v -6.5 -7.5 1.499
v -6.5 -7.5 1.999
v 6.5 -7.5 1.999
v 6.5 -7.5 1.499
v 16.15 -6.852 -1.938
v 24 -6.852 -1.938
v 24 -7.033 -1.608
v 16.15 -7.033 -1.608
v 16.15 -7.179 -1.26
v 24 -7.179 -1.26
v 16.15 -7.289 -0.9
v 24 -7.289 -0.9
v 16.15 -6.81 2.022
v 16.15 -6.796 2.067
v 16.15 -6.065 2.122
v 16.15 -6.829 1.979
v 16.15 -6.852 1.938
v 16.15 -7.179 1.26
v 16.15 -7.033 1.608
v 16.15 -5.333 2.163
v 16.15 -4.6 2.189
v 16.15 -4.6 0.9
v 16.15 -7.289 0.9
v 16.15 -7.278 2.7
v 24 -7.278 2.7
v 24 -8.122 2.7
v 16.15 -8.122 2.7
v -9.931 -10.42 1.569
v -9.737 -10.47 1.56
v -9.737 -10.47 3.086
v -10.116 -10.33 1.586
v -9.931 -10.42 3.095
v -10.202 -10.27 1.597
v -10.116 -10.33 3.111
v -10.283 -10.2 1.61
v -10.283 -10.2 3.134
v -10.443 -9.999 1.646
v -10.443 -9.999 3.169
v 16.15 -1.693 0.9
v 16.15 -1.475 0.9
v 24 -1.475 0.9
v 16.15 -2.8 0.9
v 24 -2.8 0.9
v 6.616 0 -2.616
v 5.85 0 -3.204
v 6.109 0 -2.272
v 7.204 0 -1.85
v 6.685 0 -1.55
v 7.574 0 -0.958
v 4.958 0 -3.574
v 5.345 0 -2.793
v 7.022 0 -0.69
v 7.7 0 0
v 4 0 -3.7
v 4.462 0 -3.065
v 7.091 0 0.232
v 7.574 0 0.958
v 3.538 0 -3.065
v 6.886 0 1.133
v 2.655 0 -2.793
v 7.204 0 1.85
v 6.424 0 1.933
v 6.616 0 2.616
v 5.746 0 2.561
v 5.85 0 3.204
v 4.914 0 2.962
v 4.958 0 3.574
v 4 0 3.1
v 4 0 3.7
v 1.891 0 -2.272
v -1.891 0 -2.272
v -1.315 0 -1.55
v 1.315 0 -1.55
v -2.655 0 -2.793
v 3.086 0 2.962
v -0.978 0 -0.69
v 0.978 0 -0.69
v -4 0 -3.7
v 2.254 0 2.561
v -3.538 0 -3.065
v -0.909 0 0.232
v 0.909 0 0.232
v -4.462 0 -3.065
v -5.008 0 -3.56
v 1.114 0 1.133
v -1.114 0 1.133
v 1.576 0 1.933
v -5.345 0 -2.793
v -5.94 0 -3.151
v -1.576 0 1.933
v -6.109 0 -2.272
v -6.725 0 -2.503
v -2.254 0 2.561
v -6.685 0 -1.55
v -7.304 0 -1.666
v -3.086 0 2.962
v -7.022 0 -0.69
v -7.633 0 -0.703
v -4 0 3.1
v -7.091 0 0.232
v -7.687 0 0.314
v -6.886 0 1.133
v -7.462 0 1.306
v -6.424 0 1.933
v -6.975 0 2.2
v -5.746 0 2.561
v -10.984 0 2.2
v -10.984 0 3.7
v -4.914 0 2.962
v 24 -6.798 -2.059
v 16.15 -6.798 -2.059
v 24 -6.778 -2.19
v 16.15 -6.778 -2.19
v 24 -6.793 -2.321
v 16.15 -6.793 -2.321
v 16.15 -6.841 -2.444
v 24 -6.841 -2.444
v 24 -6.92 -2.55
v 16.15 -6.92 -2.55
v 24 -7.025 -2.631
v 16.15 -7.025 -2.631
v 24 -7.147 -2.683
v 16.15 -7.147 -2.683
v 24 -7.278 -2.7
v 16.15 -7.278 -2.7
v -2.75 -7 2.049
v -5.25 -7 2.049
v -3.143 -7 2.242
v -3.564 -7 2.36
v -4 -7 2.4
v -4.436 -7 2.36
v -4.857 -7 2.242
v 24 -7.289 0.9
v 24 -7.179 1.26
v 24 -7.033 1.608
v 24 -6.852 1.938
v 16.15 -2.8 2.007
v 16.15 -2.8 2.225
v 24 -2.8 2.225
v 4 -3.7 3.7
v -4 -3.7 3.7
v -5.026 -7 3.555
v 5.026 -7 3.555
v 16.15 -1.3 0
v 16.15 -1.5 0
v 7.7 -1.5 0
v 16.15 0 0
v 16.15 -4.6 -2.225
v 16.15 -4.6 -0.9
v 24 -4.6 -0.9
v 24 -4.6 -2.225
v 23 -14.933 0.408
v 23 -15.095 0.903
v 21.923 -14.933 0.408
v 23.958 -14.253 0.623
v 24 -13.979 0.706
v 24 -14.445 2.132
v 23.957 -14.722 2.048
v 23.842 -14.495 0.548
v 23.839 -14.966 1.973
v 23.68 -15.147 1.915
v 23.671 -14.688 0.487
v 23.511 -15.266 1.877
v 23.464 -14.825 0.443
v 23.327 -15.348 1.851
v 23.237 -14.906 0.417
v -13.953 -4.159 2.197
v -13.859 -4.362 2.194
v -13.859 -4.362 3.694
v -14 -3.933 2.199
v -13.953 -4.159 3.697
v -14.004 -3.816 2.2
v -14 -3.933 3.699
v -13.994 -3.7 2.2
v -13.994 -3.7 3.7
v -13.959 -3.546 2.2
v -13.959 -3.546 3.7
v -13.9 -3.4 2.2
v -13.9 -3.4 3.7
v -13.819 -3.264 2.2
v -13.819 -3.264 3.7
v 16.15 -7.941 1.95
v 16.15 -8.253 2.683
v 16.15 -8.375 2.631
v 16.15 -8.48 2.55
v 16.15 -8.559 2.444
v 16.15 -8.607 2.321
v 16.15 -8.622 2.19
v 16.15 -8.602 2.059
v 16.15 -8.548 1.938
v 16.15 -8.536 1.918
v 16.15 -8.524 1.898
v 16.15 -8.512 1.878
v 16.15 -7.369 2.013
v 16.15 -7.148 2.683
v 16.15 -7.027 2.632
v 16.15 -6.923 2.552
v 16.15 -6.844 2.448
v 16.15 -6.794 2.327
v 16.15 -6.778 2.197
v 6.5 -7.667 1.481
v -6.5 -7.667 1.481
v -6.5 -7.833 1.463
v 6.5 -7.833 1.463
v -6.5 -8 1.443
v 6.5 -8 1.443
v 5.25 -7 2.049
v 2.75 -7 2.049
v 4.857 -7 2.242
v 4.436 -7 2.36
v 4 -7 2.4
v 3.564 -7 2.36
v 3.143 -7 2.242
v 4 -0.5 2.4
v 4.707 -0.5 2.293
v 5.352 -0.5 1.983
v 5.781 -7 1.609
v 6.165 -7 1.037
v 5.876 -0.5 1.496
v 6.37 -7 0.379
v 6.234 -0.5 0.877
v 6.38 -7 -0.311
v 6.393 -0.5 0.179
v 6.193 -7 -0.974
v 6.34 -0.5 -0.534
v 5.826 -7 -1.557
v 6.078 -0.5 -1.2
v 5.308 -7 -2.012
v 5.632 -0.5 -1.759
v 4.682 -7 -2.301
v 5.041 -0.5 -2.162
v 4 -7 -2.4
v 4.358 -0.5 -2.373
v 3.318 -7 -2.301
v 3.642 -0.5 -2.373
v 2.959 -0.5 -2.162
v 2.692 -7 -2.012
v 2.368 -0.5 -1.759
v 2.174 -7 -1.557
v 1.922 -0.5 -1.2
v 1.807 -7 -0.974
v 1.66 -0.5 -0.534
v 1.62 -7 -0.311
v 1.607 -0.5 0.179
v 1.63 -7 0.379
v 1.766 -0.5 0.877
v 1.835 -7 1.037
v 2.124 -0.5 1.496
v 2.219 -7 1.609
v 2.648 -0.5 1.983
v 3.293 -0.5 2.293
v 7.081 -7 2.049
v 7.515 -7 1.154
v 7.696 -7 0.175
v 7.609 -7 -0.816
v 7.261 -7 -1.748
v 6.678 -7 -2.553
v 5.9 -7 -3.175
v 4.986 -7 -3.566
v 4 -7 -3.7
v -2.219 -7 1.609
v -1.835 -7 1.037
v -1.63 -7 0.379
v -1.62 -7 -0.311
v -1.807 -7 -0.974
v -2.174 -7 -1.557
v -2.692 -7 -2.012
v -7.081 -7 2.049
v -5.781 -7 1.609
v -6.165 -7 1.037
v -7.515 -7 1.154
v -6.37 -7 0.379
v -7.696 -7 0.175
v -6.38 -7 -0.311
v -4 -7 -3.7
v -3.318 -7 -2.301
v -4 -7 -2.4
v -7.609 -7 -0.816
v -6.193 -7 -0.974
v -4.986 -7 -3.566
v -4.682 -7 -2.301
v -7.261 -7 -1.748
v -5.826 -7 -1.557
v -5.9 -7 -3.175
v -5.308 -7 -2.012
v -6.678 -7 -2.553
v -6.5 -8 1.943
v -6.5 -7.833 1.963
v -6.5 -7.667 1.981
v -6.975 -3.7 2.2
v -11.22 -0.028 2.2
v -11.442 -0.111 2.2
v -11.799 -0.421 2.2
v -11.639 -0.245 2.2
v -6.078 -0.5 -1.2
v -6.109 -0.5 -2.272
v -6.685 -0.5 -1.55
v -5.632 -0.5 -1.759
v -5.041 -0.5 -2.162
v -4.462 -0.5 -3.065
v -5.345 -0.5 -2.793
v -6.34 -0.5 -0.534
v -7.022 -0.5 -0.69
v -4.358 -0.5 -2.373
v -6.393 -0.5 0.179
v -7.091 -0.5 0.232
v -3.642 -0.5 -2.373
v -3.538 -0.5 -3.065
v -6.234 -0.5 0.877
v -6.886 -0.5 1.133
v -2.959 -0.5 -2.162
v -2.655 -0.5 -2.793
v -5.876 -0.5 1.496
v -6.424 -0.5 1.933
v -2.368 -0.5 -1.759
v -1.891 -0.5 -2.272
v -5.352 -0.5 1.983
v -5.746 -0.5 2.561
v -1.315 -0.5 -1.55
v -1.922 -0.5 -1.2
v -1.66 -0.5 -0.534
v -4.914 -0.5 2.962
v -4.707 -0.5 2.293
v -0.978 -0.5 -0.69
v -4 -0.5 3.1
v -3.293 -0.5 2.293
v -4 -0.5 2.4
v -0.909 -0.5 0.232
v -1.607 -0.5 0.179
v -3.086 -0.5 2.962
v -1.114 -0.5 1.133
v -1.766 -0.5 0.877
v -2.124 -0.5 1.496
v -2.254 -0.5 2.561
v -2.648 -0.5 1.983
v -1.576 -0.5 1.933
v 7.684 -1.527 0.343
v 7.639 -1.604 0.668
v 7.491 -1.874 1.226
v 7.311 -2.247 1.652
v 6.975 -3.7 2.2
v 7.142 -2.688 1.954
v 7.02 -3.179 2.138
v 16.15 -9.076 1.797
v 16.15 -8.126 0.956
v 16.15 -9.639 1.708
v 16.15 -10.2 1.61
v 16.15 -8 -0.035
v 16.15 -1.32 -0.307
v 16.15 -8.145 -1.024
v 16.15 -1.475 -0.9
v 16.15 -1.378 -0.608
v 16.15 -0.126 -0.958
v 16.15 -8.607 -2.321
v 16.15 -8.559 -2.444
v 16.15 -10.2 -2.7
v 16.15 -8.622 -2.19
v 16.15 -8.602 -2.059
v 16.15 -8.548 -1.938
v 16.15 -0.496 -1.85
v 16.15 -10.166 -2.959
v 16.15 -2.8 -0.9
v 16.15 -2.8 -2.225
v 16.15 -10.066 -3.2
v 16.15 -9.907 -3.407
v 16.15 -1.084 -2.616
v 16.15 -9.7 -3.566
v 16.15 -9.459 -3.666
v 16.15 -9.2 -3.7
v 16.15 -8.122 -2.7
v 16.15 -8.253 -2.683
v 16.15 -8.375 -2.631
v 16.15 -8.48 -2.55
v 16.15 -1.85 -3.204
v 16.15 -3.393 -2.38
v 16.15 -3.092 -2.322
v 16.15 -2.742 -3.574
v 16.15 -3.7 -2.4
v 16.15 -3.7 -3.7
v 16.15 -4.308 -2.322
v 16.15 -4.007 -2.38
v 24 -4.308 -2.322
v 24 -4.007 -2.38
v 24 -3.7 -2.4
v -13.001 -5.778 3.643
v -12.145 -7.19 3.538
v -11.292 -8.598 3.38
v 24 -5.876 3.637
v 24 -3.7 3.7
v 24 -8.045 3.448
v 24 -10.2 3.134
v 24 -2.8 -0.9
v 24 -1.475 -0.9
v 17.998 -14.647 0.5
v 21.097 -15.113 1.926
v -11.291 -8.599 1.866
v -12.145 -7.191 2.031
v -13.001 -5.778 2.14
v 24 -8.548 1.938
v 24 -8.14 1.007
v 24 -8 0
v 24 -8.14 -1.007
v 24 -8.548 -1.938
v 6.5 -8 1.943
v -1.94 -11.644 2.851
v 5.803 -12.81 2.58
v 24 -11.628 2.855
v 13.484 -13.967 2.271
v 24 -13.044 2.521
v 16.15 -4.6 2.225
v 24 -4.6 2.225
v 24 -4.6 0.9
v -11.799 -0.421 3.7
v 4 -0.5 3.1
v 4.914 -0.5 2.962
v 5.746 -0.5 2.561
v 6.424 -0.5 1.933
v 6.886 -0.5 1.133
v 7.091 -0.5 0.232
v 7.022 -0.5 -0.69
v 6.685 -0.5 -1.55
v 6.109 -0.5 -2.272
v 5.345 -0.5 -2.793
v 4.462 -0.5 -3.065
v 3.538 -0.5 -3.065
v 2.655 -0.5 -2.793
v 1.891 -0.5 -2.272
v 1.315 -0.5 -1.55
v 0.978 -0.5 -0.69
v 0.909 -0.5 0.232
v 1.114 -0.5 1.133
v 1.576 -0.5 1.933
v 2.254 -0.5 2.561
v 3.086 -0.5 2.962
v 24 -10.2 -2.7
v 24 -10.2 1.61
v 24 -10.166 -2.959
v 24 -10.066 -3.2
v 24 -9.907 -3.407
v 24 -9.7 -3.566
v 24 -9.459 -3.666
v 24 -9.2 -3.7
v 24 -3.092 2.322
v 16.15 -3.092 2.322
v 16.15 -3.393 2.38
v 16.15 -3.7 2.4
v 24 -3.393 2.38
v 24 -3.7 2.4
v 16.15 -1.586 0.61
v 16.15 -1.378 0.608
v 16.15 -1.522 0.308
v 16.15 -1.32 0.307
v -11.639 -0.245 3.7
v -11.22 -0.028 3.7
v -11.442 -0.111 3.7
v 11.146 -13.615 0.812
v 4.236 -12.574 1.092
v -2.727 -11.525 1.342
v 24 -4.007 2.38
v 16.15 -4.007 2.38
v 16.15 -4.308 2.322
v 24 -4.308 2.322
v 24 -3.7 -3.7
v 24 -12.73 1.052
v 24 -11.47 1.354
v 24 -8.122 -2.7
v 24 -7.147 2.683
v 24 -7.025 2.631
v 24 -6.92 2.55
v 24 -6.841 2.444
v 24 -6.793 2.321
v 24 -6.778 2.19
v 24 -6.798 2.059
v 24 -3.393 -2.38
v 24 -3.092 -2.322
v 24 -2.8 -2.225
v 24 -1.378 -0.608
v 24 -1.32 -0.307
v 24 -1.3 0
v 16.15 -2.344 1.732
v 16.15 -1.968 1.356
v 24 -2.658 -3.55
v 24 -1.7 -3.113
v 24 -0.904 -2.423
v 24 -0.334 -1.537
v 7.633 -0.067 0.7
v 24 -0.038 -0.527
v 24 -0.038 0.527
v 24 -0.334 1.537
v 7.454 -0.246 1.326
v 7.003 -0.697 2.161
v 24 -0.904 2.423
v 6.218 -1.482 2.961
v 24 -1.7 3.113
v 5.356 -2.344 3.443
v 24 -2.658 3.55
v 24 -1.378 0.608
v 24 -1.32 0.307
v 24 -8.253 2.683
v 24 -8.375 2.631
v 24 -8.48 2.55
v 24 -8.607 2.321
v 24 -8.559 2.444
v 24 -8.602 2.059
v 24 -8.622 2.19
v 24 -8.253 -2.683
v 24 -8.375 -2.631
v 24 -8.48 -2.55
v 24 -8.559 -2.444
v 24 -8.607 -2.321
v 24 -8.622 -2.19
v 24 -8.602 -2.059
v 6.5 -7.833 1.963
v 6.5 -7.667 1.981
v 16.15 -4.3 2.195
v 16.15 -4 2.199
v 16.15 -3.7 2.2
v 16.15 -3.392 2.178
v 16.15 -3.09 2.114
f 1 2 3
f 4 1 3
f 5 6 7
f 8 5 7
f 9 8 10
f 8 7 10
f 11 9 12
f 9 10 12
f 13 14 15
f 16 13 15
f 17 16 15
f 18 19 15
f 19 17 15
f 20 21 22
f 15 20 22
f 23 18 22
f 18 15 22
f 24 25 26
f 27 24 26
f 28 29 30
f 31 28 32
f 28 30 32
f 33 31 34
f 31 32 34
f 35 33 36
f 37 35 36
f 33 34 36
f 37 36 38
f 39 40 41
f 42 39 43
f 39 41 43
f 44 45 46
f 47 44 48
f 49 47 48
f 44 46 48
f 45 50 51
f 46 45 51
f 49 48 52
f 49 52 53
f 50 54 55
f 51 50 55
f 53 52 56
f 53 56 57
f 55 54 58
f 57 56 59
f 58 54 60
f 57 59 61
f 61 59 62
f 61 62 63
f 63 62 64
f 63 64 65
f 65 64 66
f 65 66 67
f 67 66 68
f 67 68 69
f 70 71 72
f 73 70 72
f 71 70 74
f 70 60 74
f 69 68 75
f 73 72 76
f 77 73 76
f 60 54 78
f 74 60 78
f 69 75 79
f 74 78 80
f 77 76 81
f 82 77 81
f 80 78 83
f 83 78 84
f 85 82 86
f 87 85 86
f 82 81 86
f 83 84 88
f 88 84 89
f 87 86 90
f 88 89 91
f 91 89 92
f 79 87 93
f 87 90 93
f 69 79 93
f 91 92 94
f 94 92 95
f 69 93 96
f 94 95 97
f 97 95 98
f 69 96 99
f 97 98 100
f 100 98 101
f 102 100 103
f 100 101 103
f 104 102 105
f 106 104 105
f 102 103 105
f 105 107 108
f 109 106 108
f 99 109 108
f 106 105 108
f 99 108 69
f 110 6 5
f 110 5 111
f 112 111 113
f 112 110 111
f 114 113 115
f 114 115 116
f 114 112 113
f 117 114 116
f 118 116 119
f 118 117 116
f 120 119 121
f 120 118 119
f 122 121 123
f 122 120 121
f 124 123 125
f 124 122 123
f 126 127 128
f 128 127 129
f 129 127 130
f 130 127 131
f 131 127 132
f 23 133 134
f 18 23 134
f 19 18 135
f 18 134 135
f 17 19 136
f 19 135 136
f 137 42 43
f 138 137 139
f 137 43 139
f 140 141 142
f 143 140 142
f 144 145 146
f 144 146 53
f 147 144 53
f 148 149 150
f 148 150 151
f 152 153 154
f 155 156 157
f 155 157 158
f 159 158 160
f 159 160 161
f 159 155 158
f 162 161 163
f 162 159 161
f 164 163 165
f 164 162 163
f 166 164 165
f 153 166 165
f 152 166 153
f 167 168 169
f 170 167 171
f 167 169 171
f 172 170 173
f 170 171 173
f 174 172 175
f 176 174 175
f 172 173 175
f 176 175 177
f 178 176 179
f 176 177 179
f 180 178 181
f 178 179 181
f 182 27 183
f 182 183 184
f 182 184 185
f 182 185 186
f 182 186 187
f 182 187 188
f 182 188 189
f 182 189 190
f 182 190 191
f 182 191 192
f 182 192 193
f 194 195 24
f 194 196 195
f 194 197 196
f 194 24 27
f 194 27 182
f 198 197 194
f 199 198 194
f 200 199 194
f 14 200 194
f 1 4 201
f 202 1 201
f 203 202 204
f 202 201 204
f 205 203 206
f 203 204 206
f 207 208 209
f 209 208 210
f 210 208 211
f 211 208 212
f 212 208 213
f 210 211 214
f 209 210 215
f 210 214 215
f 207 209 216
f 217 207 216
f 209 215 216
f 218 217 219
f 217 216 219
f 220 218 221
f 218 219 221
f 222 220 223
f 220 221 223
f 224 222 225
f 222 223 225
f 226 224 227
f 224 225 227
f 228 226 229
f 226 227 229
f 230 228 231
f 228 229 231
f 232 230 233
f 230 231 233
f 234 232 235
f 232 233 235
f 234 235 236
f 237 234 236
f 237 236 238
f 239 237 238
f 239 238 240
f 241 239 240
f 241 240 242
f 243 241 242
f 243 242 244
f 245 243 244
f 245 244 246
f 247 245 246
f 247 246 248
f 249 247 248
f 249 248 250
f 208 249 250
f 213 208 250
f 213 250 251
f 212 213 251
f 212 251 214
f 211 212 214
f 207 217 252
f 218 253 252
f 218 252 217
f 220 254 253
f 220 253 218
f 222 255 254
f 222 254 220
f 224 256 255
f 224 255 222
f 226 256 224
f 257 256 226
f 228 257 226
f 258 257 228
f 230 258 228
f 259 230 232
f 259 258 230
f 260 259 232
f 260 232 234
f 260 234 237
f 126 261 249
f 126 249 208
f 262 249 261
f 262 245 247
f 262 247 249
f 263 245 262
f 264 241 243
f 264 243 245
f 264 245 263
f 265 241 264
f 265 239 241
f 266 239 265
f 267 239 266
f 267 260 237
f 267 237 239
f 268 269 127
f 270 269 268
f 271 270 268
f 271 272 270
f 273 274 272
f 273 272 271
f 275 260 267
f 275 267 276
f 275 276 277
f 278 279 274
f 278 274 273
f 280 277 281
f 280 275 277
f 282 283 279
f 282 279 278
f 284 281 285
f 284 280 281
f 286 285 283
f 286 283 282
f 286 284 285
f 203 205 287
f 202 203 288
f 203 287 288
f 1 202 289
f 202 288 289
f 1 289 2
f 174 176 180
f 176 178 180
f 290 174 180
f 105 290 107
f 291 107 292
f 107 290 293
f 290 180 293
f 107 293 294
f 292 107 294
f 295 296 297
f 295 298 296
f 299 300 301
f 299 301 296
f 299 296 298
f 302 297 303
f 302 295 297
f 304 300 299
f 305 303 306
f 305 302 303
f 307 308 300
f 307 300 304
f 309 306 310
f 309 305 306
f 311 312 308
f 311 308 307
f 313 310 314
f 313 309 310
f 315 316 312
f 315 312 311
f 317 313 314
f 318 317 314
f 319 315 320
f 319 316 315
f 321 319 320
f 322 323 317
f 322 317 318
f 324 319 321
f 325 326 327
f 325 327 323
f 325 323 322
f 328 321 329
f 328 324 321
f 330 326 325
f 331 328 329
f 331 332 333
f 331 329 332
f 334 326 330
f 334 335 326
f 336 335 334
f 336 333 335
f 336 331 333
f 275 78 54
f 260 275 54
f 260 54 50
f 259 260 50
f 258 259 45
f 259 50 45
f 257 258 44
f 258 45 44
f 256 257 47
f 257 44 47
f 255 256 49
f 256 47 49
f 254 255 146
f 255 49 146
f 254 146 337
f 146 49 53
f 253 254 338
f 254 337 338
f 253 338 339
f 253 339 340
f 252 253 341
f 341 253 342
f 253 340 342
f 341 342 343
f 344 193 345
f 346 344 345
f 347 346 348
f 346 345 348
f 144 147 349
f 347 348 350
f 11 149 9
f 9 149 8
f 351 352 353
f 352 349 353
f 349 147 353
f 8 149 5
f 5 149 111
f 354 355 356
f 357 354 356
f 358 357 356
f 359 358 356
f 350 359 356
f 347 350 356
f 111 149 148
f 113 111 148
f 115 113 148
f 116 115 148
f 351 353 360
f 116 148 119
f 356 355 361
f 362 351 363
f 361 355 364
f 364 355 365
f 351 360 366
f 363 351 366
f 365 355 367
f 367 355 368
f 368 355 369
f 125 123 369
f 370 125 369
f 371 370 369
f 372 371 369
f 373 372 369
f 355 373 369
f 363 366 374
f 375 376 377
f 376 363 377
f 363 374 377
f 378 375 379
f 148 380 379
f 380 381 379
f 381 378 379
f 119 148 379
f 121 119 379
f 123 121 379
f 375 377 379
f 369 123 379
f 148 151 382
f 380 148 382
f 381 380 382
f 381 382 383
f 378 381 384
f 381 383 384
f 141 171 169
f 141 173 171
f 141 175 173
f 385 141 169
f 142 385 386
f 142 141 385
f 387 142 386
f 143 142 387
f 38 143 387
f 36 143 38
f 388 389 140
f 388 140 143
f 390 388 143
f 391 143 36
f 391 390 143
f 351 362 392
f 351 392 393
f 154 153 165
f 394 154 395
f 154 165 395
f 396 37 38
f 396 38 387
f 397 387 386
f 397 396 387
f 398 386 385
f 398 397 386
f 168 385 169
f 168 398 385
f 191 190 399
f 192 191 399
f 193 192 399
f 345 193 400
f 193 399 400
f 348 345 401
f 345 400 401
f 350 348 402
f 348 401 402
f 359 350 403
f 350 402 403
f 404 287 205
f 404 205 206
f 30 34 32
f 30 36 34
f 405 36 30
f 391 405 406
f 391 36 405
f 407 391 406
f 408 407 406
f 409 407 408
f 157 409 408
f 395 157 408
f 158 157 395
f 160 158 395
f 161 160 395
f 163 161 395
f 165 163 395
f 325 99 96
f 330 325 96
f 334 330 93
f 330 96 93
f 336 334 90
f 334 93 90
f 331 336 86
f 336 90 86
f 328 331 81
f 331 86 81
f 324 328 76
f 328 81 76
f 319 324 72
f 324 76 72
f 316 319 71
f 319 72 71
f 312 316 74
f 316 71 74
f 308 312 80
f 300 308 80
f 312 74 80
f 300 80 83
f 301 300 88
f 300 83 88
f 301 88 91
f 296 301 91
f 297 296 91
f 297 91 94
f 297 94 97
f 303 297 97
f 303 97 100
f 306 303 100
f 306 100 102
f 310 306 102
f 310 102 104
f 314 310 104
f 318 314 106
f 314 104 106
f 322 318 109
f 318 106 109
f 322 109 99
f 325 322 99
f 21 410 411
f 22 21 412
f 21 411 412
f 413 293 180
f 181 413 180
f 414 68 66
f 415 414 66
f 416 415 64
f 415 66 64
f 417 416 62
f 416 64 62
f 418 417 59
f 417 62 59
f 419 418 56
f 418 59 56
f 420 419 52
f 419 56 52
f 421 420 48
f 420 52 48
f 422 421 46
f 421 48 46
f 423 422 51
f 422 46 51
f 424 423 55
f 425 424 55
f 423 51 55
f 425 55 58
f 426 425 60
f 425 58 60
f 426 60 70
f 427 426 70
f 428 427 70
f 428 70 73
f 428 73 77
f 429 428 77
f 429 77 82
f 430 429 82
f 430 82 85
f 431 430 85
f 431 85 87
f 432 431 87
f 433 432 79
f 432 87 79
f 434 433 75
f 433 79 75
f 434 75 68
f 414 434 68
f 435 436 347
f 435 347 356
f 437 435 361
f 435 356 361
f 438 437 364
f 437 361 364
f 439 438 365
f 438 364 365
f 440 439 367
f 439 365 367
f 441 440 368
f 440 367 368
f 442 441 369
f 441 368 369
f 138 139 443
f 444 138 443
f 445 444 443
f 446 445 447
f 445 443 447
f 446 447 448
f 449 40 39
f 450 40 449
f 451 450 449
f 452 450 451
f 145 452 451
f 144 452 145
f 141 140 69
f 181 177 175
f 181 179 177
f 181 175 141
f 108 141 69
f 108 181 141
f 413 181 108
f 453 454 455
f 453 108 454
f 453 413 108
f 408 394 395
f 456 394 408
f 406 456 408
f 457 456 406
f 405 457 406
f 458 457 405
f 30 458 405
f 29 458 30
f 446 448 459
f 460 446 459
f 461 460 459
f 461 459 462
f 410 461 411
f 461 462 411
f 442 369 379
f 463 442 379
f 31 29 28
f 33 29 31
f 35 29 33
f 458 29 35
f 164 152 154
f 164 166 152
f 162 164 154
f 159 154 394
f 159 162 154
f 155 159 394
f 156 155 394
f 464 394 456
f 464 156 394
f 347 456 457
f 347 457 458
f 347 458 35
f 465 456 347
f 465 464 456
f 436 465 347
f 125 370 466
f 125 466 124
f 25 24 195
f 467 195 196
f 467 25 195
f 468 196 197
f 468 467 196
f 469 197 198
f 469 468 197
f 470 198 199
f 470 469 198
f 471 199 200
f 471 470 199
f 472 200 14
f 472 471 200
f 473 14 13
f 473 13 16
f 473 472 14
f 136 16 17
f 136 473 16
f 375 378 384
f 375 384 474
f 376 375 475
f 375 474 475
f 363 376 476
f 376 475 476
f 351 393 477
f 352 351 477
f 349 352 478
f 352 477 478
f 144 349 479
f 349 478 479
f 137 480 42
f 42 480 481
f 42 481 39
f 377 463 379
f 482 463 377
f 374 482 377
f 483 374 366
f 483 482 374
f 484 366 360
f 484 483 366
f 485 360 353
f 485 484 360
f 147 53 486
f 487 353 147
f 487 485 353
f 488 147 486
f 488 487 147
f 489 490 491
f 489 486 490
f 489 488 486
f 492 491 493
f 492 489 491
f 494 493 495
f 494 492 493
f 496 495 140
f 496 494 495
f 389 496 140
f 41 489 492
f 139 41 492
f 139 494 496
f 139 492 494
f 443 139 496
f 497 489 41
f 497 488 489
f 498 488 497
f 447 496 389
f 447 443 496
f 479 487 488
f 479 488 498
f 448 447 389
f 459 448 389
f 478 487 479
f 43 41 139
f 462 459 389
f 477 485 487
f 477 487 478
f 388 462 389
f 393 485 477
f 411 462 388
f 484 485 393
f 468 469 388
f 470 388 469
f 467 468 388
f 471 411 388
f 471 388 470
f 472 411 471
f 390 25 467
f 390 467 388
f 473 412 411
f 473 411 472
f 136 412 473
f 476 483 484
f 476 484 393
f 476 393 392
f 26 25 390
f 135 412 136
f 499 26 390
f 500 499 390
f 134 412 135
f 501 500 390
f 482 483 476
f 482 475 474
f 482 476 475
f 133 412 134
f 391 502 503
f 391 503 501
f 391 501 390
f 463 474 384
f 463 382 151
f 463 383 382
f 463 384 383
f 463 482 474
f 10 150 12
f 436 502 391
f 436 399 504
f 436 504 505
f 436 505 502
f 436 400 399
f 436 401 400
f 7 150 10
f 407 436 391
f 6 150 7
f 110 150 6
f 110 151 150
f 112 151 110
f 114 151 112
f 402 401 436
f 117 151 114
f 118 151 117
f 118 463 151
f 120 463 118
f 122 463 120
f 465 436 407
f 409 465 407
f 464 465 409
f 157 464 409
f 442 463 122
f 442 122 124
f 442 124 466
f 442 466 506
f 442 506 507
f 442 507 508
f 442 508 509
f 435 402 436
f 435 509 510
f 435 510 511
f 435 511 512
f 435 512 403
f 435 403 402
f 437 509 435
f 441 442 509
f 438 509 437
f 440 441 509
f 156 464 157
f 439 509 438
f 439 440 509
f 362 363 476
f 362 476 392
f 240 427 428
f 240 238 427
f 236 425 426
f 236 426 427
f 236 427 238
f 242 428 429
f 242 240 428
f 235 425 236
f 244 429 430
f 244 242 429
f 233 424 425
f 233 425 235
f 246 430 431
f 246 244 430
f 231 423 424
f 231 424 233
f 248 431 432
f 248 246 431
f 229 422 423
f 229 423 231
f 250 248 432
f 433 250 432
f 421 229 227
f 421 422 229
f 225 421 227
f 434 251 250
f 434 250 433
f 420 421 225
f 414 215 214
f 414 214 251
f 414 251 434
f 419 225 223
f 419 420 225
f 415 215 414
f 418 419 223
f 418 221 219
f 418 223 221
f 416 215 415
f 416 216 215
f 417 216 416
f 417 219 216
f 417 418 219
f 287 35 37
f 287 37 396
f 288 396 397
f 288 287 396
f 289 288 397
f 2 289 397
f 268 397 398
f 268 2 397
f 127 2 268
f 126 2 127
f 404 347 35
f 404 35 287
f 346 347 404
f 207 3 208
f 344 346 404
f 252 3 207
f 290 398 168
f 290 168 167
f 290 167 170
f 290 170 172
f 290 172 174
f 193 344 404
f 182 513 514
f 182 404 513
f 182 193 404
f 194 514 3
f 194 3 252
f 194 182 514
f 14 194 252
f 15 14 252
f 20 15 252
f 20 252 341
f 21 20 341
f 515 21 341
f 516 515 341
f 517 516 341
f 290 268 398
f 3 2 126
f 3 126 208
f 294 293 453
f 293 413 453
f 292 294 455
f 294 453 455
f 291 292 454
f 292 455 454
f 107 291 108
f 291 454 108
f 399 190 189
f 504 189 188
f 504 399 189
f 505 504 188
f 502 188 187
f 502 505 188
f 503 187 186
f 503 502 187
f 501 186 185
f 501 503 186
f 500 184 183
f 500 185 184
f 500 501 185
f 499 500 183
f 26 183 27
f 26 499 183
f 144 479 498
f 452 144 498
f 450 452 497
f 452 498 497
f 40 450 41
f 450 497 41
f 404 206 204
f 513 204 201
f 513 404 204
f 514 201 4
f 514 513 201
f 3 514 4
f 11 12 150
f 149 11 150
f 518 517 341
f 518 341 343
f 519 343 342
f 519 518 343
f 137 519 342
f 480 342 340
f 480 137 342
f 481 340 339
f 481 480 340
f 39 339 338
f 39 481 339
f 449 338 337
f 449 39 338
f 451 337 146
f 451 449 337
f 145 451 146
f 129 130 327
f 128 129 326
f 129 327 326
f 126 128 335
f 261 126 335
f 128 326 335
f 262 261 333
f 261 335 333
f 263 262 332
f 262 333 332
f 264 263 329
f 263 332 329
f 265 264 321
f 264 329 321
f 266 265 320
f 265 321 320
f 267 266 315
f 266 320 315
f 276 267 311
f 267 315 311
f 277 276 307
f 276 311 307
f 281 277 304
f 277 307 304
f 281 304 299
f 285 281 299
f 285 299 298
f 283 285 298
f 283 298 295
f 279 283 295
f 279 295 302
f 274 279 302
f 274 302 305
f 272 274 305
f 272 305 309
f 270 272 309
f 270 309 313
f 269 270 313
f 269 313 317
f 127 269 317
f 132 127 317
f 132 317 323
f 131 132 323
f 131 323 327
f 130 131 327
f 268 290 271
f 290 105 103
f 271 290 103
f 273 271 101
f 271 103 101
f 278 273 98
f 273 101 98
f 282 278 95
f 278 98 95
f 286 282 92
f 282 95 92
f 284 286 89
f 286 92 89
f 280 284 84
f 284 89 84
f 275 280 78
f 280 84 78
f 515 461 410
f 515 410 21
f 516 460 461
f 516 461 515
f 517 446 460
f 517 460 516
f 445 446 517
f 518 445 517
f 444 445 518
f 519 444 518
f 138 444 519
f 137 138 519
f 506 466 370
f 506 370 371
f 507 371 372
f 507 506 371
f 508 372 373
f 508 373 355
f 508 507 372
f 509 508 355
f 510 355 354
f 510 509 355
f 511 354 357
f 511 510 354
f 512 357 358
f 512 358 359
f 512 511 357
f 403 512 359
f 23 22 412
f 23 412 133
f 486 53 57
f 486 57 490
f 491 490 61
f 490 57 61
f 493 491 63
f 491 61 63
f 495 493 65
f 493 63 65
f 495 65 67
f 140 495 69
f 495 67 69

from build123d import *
from build123d.topology import SkipClean

# Parameters (mm, degrees)
F_2_BLOCK_BODY_DEPTH        = 7
AXLE_START                  = 24
SKETCH2_R                   = 3.7
AXLE_BODY_DEPTH             = 7.85
FAIRING_TOP_REACH           = 35.506
FAIRING_TOP_END_RADIUS      = 3.7
FAIRING_BOTTOM_DEPTH        = 38.2
FAIRING_SIDE_CUT_DEPTH      = 29.754999715
FAIRING_SIDE_CUT_DEPTH_BACK = 29.754999715
FAIRING_CORNER_REACH        = 43.353
FAIRING_CORNER_END_RADIUS   = 3.7
SKETCH6_W                   = 1.5
SKETCH6_H                   = 3.7
SKETCH3_W                   = 1.8
SKETCH3_H                   = 1.8
AXLE_CUT_DEPTH              = 7.85
FILLET1_R                   = 0.5
SKETCH7_R                   = 2.4
BLOCK_HOLES_DEPTH           = 7
SKETCH8_R                   = 3.1
SKETCH8_R_2                 = 2.4
RIM_CUTS_DEPTH              = 0.5
STOPPER_REACH               = 31.255
STOPPER_START_RADIUS        = 36.103557437
STOPPER_END_RADIUS          = 36.103557437
SKETCH9_W                   = 13
SKETCH9_H                   = 0.5
FILLET2_R                   = 1
FAIRING_MAIN_CUT_DEPTH      = 29.754999715
FAIRING_MAIN_CUT_DEPTH_BACK = 29.754999715
FILLET3_R                   = 5
FILLET4_R                   = 1


with BuildPart() as part:
    # Sketch1 → 2 Block Body (new body)
    with BuildSketch(Plane(origin=(0, 0, 0), x_dir=(1, 0, 0), z_dir=(0, 1, 0))):
        with BuildLine():
            Line((4, -3.7), (-4, -3.7))
            ThreePointArc((-4, -3.7), (-7.7, 0), (-4, 3.7))
            Line((-4, 3.7), (4, 3.7))
            ThreePointArc((4, 3.7), (7.7, 0), (4, -3.7))
        make_face()
    extrude(amount=-F_2_BLOCK_BODY_DEPTH)



with BuildPart() as body_2:
    # Sketch2 → Axle Body (new body)
    with BuildSketch(Plane(origin=(0, 0, 0), x_dir=(0, 0, -1), z_dir=(1, 0, 0)).offset(AXLE_START)):
        with BuildLine():
            ThreePointArc((3.7, -3.7), (0, -7.4), (-3.7, -3.7))
            Line((-3.7, -3.7), (-3.7, -10.2))
            Line((-3.7, -10.2), (3.7, -10.2))
            Line((3.7, -10.2), (3.7, -3.7))
        make_face()
        with Locations((0, -3.7)):
            Circle(SKETCH2_R)
    extrude(amount=-AXLE_BODY_DEPTH)


with BuildPart() as part_1:
    add(part.part)

    add(body_2.part)  # Fairing Top merges body 2
    # Fairing Top: up to this cylinder (the profile starts outside it)
    fairing_top_end = Plane(origin=(4, -1.781509, 0), z_dir=(0, 1, 0)) * Cylinder(FAIRING_TOP_END_RADIUS, 79.412, mode=Mode.PRIVATE)
    # Sketch4 → Fairing Top (add, up to the surface)
    with BuildSketch(Plane(origin=(24, 0, 0), x_dir=(0, 0, -1), z_dir=(1, 0, 0)), mode=Mode.PRIVATE) as fairing_top_sk1:
        with BuildLine():
            Line((0, -1.5), (0, 0))
            ThreePointArc((0, 0), (-2.61629509, -1.08370491), (-3.7, -3.7))
            Line((-3.7, -3.7), (-2.2, -3.7))
            ThreePointArc((-2.2, -3.7), (-1.555634919, -2.144365081), (0, -1.5))
        make_face()
    fairing_top_tool1 = extrude(fairing_top_sk1.sketch, amount=-FAIRING_TOP_REACH, mode=Mode.PRIVATE) - fairing_top_end
    add(fairing_top_tool1.solids().sort_by_distance((24, -1.781509, 1.918491))[0])

    # Sketch4<3> → Fairing Bottom (add)
    with BuildSketch(Plane(origin=(24, 0, 0), x_dir=(0, 0, -1), z_dir=(1, 0, 0))):
        with BuildLine():
            Line((-1.610057693, -10.2), (-3.133957759, -10.2))
            ThreePointArc((-3.133957759, -10.2), (-2.576502002, -12.823200932), (-1.833503605, -15.4))
            Line((-1.833503605, -15.4), (-0.407957853, -14.933288838))
            ThreePointArc((-0.407957853, -14.933288838), (-1.08913059, -12.586992982), (-1.610057693, -10.2))
        make_face()
        with BuildLine():
            Line((-2.2, -3.7), (-3.7, -3.7))
            ThreePointArc((-3.7, -3.7), (-3.558222165, -6.962299949), (-3.133957759, -10.2))
            Line((-3.133957759, -10.2), (-1.610057693, -10.2))
            ThreePointArc((-1.610057693, -10.2), (-2.052211942, -6.96335839), (-2.2, -3.7))
        make_face()
    extrude(amount=-FAIRING_BOTTOM_DEPTH)

    # Sketch5 → Fairing Side Cut (cut, two sides: drawn at the far end of the back side and taken through both)
    with SkipClean():  # the faces are left unmerged after this step: merging them gives an invalid solid
        with BuildSketch(Plane(origin=(0, 0, 0), x_dir=(0, 0, -1), z_dir=(1, 0, 0)).offset(-FAIRING_SIDE_CUT_DEPTH_BACK)):
            with BuildLine():
                Line((-1.833503605, -15.4), (-3.7, -15.4))
                Line((-3.7, -15.4), (-3.7, -3.7))
                ThreePointArc((-3.7, -3.7), (-3.230444229, -9.62397267), (-1.833503605, -15.4))
            make_face()
        extrude(amount=FAIRING_SIDE_CUT_DEPTH + FAIRING_SIDE_CUT_DEPTH_BACK, mode=Mode.SUBTRACT)

    # Fairing Corner: up to this cylinder (the profile starts outside it)
    fairing_corner_end = Plane(origin=(-4, -1.85, 0), z_dir=(0, 1, 0)) * Cylinder(FAIRING_CORNER_END_RADIUS, 95.106, mode=Mode.PRIVATE)
    # Sketch6 → Fairing Corner (add, up to the surface)
    with BuildSketch(Plane.ZY.offset(14.2), mode=Mode.PRIVATE) as fairing_corner_sk1:
        with Locations((2.95, -1.85)):
            Rectangle(SKETCH6_W, SKETCH6_H)
    fairing_corner_tool1 = extrude(fairing_corner_sk1.sketch, amount=-FAIRING_CORNER_REACH, mode=Mode.PRIVATE) - fairing_corner_end
    add(fairing_corner_tool1.solids().sort_by_distance((-14.2, -1.85, 2.95))[0])

    # Sketch3 → Axle Cut (cut)
    with BuildSketch(Plane(origin=(24, 0, 0), x_dir=(0, 0, -1), z_dir=(1, 0, 0))):
        with BuildLine():
            Line((-2.224859546, -4.6), (-0.9, -4.6))
            Line((-0.9, -4.6), (-0.9, -2.8))
            Line((-0.9, -2.8), (-2.224859546, -2.8))
            ThreePointArc((-2.224859546, -2.8), (-2.355808026, -3.24155857), (-2.4, -3.7))
            ThreePointArc((-2.4, -3.7), (-2.355808026, -4.15844143), (-2.224859546, -4.6))
        make_face()
        with BuildLine():
            Line((-0.9, -2.8), (0.9, -2.8))
            Line((0.9, -2.8), (0.9, -1.475140454))
            ThreePointArc((0.9, -1.475140454), (0.45844143, -1.344191974), (0, -1.3))
            ThreePointArc((0, -1.3), (-0.45844143, -1.344191974), (-0.9, -1.475140454))
            Line((-0.9, -1.475140454), (-0.9, -2.8))
        make_face()
        with Locations((0, -3.7)):
            Rectangle(SKETCH3_W, SKETCH3_H)
        with BuildLine():
            Line((0.9, -5.924859546), (0.9, -4.6))
            Line((0.9, -4.6), (-0.9, -4.6))
            Line((-0.9, -4.6), (-0.9, -5.924859546))
            ThreePointArc((-0.9, -5.924859546), (-0.45844143, -6.055808026), (0, -6.1))
            ThreePointArc((0, -6.1), (0.45844143, -6.055808026), (0.9, -5.924859546))
        make_face()
        with BuildLine():
            Line((0.9, -4.6), (2.224859546, -4.6))
            ThreePointArc((2.224859546, -4.6), (2.355808026, -4.15844143), (2.4, -3.7))
            ThreePointArc((2.4, -3.7), (2.355808026, -3.24155857), (2.224859546, -2.8))
            Line((2.224859546, -2.8), (0.9, -2.8))
            Line((0.9, -2.8), (0.9, -4.6))
        make_face()
        with BuildLine():
            Line((0.9, -7.288871689), (0.9, -6.1))
            Line((0.9, -6.1), (0, -6.1))
            Line((0, -6.1), (-0.9, -6.1))
            Line((-0.9, -6.1), (-0.9, -7.288871689))
            ThreePointArc((-0.9, -7.288871689), (0, -7.4), (0.9, -7.288871689))
        make_face()
        with BuildLine():
            Line((-0.9, -6.1), (0, -6.1))
            ThreePointArc((0, -6.1), (-0.45844143, -6.055808026), (-0.9, -5.924859546))
            Line((-0.9, -5.924859546), (-0.9, -6.1))
        make_face()
        with BuildLine():
            Line((0.9, -6.1), (0.9, -5.924859546))
            ThreePointArc((0.9, -5.924859546), (0.45844143, -6.055808026), (0, -6.1))
            Line((0, -6.1), (0.9, -6.1))
        make_face()
        with BuildLine():
            ThreePointArc((2.7, -6.229822128), (1.876271967, -6.888981578), (0.9, -7.288871689))
            ThreePointArc((0.9, -7.288871689), (0, -7.4), (-0.9, -7.288871689))
            ThreePointArc((-0.9, -7.288871689), (-1.876271967, -6.888981578), (-2.7, -6.229822128))
            Line((-2.7, -6.229822128), (-2.7, -9.170177872))
            ThreePointArc((-2.7, -9.170177872), (0, -8), (2.7, -9.170177872))
            Line((2.7, -9.170177872), (2.7, -6.229822128))
        make_face()
    extrude(amount=-AXLE_CUT_DEPTH, mode=Mode.SUBTRACT)

    # Fillet1
    # the kernel refuses this fillet: 0.5 mm, written as the material it adds along each edge
    with BuildSketch(Plane(origin=(24, -6.229822128, -2.7), x_dir=(0, -1, 0), z_dir=(-1, 0, 0))) as fillet1_piece_1:
        with BuildLine():
            CenterArc((1.047886636, 0.5), FILLET1_R, 148.411864495, 121.588135505)
            ThreePointArc((0.621968926, 0.761904762), (0.336413522, 0.36019377), (0, 0))
            Line((0, 0), (1.047886636, 0))
        make_face()
    extrude(amount=7.85)
    with BuildSketch(Plane(origin=(24, -9.170177872, -2.7), x_dir=(0, 0.6323800622573651, 0.7746582839287082), z_dir=(-1, 0, 0)), Plane(origin=(24, -6.229822128, 2.7), x_dir=(0, -0.6323800622573447, -0.7746582839287249), z_dir=(-1, 0, 0))) as fillet1_piece_2:
        with BuildLine():
            CenterArc((1.049991758, 0.495564032), FILLET1_R, 140.774061683, 121.588135505)
            Line((0.662662616, 0.811754063), (0, 0))
            ThreePointArc((0, 0), (0.491768292, 0.032826163), (0.983536583, 0))
        make_face()
    extrude(amount=7.85)
    with BuildSketch(Plane(origin=(24, -9.170177872, 2.7), x_dir=(0, 1, 0), z_dir=(-1, 0, 0))) as fillet1_piece_3:
        with BuildLine():
            CenterArc((1.047886636, 0.5), FILLET1_R, 148.411864495, 121.588135505)
            ThreePointArc((0.621968926, 0.761904762), (0.336413522, 0.36019377), (0, 0))
            Line((0, 0), (1.047886636, 0))
        make_face()
    extrude(amount=10.46971659)

    # Sketch7 → Block Holes (cut)
    with BuildSketch(Plane(origin=(0, 0, 0), x_dir=(1, 0, 0), z_dir=(0, 1, 0))):
        with Locations(Location((-4, 0, 0), (0, 0, 270))):
            Circle(SKETCH7_R)
        with Locations(Location((4, 0, 0), (0, 0, 270))):
            Circle(SKETCH7_R)
    extrude(amount=-BLOCK_HOLES_DEPTH, mode=Mode.SUBTRACT)

    # Sketch8 → Rim Cuts (cut)
    # profile 1 of 2: a face of its own
    with BuildSketch(Plane(origin=(0, 0, 0), x_dir=(1, 0, 0), z_dir=(0, 1, 0))):
        with Locations(Location((-4, 0, 0), (0, 0, 270))):
            Circle(SKETCH8_R)
        with Locations(Location((-4, 0, 0), (0, 0, 270))):
            Circle(SKETCH8_R_2, mode=Mode.SUBTRACT)
    # profile 2 of 2: a face of its own
    with BuildSketch(Plane(origin=(0, 0, 0), x_dir=(1, 0, 0), z_dir=(0, 1, 0))):
        with Locations(Location((4, 0, 0), (0, 0, 270))):
            Circle(SKETCH8_R)
        with Locations(Location((4, 0, 0), (0, 0, 270))):
            Circle(SKETCH8_R_2, mode=Mode.SUBTRACT)
    extrude(amount=-RIM_CUTS_DEPTH, mode=Mode.SUBTRACT)

    # Stopper: from a cylinder face, 31.255 long prism both ways, kept between that surface and its translate by the depth
    stopper_start = Plane(origin=(0, -3.7, -33.903557437), z_dir=(1, 0, 0)) * Cylinder(STOPPER_START_RADIUS, 135.717114875, mode=Mode.PRIVATE)
    stopper_end = Plane(origin=(0, -3.7, -34.403557437), z_dir=(1, 0, 0)) * Cylinder(STOPPER_END_RADIUS, 135.717114875, mode=Mode.PRIVATE)
    # Sketch9 → Stopper (add, from a surface)
    with BuildSketch(Plane.XY, mode=Mode.PRIVATE) as stopper_sk1:
        with Locations((0, -7.75)):
            Rectangle(SKETCH9_W, SKETCH9_H)
    stopper_tool1 = extrude(stopper_sk1.sketch, amount=STOPPER_REACH, both=True, mode=Mode.PRIVATE)
    add(((stopper_tool1 & stopper_start) - stopper_end).solids().sort_by_distance((0, -7.75, 1.72124))[0])

    # Fillet2
    fillet2_edges = [part_1.edges().sort_by_distance(p)[0] for p in [
        (24, -15.166644419, 1.120730729),
    ]]
    fillet(fillet2_edges, radius=FILLET2_R)

    # Sketch10 → Fairing Main Cut (cut, two sides: drawn at the far end of the back side and taken through both)
    with BuildSketch(Plane.XY.offset(-FAIRING_MAIN_CUT_DEPTH_BACK)):
        Polygon((-14.2, -3.8), (-14.2, 0), (-11.5, 0), align=None)
        Polygon((23, -15.4), (-10.2, -10.4), (-14.2, -3.8), (-14.2, -15.4), align=None)
    extrude(amount=FAIRING_MAIN_CUT_DEPTH + FAIRING_MAIN_CUT_DEPTH_BACK, mode=Mode.SUBTRACT)

    # Fillet3
    # the kernel refuses this fillet: 5 mm, written as the material it takes off along each edge
    with BuildSketch(Plane(origin=(24.982656407, -15.698592832, 2.745540381), x_dir=(-0.40943647865659716, 0.061662120279605645, 0.9102524665541475), z_dir=(-0.900102053497931, 0.1355575381773993, -0.41405367663153375))) as fillet3_piece_1:
        with BuildLine():
            CenterArc((FILLET3_R * 0.17621614345, FILLET3_R), FILLET3_R, 250.012318265, 19.987681735)
            Line((-FILLET3_R * 0.165601963428, FILLET3_R * 0.0602338685556), (-FILLET3_R * 0.172438325566, FILLET3_R * 0.0414385459267))
            Line((-FILLET3_R * 0.172438325566, FILLET3_R * 0.0414385459267), (-FILLET3_R * 0.003524322869, -FILLET3_R * 0.02))
            Line((-FILLET3_R * 0.003524322869, -FILLET3_R * 0.02), (FILLET3_R * 0.17621614345, -FILLET3_R * 0.02))
            Line((FILLET3_R * 0.17621614345, -FILLET3_R * 0.02), (FILLET3_R * 0.17621614345, 0))
        make_face()
    extrude(amount=7.848304428, mode=Mode.SUBTRACT)

    # Fillet4
    fillet4_edges = [part_1.edges().sort_by_distance(p)[0] for p in [
        (-11.5, 0, 2.95),
        (-10.2, -10.4, 2.335585217),
        (-14.2, -3.8, 2.949864271),
        (20.075, -10.2, -3.7),
    ]]
    fillet(fillet4_edges, radius=FILLET4_R)


solid = part_1.part
